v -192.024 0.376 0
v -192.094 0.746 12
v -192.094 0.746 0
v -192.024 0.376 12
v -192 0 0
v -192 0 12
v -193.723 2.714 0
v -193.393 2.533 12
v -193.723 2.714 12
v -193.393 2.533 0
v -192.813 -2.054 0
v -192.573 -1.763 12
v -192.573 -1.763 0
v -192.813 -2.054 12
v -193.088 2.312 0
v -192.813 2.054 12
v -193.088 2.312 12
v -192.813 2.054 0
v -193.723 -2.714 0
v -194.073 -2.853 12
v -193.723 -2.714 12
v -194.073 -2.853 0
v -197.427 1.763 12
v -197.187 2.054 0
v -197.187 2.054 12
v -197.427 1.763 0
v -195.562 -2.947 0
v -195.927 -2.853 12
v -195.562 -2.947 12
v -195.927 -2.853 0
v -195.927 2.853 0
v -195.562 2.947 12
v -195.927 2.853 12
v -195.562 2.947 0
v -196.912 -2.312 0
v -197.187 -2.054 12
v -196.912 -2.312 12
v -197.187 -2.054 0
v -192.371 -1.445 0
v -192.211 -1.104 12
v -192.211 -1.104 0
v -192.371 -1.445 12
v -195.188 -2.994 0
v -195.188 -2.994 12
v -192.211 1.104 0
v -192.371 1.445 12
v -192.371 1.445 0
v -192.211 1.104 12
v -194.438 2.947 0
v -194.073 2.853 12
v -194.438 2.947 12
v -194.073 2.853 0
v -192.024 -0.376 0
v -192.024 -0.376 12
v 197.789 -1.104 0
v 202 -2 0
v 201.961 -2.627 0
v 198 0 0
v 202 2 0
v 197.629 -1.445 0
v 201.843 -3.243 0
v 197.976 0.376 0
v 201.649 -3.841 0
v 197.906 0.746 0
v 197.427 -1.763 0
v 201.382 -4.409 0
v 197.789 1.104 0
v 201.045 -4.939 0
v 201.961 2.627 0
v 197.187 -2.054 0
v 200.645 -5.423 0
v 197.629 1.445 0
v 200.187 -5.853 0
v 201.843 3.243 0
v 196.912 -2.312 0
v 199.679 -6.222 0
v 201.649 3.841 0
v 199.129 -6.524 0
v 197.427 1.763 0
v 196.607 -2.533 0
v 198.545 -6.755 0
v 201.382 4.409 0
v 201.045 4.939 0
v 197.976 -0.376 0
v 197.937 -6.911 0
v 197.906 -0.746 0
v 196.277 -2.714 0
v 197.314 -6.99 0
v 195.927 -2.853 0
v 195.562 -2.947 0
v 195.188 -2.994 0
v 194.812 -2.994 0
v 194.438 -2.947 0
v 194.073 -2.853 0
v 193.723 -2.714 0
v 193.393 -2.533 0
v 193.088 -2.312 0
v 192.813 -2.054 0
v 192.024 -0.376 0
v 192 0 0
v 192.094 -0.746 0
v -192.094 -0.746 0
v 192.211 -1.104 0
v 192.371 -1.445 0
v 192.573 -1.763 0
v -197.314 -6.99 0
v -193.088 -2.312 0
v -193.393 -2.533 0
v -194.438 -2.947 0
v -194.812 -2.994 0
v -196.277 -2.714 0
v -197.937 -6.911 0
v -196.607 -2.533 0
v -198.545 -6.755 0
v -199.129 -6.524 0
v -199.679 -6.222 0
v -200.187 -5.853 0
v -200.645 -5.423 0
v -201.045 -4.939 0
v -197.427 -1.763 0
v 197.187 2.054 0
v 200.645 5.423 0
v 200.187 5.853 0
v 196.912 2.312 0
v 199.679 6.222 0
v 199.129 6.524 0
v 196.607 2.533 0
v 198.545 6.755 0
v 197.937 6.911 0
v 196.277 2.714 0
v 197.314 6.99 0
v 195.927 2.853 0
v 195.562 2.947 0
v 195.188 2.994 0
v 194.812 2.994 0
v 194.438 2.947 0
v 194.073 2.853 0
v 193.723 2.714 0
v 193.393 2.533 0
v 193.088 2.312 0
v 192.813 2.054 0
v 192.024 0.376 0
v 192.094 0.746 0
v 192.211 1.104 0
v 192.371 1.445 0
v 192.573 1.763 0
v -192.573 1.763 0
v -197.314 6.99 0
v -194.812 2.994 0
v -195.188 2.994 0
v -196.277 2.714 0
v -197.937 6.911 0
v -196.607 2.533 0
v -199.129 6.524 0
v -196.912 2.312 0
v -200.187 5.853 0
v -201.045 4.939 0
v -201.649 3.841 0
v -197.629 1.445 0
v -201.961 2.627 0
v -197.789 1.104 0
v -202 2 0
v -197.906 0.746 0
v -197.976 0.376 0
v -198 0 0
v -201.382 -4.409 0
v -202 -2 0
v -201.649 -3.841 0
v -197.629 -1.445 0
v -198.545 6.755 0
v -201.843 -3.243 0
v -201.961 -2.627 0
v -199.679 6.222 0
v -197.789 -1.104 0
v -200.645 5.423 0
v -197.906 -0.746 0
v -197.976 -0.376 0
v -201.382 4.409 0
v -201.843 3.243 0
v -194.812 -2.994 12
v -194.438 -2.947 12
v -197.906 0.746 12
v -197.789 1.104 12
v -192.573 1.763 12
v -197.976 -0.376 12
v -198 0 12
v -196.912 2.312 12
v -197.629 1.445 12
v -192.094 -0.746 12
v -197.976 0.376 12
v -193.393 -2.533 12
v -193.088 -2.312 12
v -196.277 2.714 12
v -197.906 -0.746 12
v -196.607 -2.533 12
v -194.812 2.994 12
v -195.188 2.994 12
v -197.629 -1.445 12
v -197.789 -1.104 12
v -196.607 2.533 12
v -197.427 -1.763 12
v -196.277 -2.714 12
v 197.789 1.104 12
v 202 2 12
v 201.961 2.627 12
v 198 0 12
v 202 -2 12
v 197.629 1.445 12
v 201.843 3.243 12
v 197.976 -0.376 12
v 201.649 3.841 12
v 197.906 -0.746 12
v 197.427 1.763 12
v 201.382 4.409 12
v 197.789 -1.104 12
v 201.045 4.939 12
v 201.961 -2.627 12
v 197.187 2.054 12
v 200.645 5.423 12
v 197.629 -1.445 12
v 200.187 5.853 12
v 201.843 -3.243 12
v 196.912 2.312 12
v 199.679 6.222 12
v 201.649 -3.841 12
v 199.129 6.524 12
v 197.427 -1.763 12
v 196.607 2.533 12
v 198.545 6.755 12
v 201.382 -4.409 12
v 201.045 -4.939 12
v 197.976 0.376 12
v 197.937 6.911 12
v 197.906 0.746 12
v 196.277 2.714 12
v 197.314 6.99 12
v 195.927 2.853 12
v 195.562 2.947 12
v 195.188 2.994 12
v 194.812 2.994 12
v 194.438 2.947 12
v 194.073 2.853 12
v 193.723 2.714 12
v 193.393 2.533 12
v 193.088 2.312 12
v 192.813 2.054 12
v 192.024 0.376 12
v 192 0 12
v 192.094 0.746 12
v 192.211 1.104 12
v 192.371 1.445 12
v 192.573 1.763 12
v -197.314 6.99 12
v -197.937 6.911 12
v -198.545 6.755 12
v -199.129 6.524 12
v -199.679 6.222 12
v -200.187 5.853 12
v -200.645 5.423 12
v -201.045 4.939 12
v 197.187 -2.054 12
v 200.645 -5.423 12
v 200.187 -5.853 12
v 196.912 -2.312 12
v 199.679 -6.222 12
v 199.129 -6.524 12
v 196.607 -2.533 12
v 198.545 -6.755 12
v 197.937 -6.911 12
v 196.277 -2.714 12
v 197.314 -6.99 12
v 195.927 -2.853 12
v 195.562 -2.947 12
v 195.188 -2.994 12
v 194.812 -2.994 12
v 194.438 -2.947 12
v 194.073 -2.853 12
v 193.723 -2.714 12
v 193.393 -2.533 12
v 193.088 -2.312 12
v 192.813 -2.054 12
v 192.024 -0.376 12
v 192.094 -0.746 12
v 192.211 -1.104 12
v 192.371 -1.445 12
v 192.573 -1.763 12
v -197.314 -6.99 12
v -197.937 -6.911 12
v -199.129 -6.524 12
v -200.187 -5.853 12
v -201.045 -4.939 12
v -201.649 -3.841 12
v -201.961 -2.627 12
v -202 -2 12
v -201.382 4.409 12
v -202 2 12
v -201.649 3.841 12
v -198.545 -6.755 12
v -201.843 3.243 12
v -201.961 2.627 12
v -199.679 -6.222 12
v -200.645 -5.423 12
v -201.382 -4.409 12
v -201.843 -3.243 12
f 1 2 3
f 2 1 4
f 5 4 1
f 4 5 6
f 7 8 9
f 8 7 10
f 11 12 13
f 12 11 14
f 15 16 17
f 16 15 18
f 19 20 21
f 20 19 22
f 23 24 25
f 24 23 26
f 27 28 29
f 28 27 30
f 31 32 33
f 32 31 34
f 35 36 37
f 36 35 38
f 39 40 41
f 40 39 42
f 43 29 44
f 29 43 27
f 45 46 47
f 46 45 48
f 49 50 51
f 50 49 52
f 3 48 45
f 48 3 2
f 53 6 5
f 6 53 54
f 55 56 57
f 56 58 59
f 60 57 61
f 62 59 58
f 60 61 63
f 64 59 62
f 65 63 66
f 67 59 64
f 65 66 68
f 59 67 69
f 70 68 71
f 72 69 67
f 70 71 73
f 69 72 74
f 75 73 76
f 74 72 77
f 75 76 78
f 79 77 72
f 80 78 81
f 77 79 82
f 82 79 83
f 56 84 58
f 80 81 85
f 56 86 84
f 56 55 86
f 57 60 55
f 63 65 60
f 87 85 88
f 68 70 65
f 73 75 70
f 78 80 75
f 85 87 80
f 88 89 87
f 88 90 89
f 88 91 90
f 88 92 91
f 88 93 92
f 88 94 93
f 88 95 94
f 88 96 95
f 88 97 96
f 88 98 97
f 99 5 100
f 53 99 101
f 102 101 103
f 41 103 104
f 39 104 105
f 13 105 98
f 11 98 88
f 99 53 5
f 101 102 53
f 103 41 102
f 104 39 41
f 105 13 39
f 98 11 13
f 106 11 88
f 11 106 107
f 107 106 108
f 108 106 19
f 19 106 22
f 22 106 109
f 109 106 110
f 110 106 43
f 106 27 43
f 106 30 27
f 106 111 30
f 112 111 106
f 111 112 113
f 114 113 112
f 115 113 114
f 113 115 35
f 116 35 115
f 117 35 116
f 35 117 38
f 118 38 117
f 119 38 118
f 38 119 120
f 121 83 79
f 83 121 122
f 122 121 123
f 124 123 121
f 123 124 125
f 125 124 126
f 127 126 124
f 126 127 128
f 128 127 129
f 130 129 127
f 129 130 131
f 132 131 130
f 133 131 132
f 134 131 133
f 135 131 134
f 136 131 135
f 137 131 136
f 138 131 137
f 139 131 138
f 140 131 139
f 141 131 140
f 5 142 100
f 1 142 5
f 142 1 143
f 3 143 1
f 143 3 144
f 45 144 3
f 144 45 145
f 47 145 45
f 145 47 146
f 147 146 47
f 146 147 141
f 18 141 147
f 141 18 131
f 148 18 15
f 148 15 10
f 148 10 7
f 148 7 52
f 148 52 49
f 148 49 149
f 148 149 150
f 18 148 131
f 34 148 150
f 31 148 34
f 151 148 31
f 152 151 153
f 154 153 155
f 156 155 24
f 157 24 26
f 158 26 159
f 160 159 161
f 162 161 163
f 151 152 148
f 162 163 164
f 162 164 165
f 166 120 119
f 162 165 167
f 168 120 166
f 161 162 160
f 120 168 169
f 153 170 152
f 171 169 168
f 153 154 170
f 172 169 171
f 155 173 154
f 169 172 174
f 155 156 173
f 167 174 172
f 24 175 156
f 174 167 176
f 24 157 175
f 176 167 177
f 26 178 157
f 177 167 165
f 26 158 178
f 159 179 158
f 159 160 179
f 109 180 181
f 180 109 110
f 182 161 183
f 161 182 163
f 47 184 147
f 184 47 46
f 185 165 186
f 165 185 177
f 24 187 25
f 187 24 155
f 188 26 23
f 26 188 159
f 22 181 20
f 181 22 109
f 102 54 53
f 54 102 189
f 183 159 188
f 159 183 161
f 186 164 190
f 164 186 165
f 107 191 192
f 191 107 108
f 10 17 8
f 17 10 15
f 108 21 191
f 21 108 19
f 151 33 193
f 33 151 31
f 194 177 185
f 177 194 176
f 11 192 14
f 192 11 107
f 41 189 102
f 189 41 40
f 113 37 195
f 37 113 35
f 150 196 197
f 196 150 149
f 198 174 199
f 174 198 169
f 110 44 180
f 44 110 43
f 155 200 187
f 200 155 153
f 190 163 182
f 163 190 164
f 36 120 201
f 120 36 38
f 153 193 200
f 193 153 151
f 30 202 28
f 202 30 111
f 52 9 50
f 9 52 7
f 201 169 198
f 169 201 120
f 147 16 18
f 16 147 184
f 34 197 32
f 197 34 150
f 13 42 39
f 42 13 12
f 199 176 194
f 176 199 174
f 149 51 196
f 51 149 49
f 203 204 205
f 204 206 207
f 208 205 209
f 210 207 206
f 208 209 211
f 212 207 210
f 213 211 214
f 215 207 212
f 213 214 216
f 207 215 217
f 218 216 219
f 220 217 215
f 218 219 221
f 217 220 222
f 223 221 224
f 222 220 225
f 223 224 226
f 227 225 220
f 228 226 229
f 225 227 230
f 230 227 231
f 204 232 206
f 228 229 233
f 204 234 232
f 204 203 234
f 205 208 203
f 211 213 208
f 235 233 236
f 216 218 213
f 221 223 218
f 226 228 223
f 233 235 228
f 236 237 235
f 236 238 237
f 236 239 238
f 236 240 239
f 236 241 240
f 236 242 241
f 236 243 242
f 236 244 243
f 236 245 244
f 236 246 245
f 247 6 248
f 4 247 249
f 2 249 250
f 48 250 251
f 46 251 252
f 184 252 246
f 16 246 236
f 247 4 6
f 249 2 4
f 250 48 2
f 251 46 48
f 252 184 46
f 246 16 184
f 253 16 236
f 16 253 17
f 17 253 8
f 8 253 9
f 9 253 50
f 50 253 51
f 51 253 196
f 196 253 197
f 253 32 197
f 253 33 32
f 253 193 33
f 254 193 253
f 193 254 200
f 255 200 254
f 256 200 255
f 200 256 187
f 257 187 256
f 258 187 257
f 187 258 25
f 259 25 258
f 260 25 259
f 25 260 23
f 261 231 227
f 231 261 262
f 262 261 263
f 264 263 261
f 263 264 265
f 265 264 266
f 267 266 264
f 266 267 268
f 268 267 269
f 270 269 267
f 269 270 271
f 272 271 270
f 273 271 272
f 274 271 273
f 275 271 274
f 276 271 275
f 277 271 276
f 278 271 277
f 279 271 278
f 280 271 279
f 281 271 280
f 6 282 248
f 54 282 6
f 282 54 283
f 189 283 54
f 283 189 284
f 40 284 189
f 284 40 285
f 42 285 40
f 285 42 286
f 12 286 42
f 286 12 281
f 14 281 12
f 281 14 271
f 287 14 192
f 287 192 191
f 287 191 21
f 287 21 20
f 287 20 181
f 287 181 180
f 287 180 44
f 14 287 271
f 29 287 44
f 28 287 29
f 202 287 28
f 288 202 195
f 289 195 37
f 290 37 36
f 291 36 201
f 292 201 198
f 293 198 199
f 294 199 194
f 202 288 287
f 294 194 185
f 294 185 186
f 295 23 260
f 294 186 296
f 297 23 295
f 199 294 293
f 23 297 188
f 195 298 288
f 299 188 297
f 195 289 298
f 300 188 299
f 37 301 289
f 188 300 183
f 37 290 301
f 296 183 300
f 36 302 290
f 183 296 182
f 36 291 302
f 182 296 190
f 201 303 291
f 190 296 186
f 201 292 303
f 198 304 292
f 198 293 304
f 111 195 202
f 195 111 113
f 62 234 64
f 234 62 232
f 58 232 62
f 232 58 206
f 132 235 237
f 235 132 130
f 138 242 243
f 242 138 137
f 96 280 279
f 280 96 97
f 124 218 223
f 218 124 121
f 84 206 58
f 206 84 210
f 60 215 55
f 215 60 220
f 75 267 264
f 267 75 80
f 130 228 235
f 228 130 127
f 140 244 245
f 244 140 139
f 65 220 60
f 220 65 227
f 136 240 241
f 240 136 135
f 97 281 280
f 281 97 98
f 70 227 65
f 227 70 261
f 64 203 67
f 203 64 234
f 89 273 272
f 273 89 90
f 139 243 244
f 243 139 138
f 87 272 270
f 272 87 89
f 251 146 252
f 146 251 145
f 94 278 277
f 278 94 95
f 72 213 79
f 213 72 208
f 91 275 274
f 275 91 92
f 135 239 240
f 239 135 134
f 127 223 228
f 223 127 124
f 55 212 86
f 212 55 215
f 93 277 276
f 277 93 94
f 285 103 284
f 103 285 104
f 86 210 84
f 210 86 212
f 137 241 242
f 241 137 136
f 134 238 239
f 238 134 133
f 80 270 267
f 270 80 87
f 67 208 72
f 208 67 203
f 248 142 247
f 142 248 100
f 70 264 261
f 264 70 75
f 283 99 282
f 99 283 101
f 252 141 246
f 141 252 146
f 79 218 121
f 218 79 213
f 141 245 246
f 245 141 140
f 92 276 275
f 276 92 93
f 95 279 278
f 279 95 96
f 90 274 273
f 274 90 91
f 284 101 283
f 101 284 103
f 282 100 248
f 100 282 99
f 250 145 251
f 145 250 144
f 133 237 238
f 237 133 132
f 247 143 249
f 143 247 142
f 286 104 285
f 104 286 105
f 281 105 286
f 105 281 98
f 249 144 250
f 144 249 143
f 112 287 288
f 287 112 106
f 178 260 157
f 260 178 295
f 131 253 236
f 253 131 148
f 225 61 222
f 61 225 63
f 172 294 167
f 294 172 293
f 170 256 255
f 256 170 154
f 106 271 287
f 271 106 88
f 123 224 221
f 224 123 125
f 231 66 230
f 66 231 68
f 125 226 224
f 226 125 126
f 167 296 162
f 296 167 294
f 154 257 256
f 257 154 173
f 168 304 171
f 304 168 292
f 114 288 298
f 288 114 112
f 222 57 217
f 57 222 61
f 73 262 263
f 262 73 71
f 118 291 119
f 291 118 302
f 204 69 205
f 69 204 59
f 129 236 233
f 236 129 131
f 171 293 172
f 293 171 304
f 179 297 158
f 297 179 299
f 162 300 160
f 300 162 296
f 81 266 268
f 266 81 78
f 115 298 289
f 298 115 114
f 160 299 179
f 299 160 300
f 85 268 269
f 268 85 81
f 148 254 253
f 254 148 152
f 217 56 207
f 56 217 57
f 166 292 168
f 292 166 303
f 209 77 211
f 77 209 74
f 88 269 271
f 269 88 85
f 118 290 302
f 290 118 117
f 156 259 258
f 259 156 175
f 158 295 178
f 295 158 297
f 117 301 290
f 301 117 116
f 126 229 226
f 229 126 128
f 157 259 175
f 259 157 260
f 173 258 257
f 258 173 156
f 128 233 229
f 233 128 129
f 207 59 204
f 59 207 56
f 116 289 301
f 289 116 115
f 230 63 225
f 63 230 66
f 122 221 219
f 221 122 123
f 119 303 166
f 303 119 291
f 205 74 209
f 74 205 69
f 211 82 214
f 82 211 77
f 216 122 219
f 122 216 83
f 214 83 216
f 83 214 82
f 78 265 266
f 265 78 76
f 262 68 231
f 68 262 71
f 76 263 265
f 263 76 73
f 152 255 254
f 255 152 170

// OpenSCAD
$fn = 50;


difference() {
	union() {
		hull() {
			translate(v = [-197.0000000000, 2.0000000000, 0]) {
				cylinder(h = 12, r = 5);
			}
			translate(v = [197.0000000000, 2.0000000000, 0]) {
				cylinder(h = 12, r = 5);
			}
			translate(v = [-197.0000000000, -2.0000000000, 0]) {
				cylinder(h = 12, r = 5);
			}
			translate(v = [197.0000000000, -2.0000000000, 0]) {
				cylinder(h = 12, r = 5);
			}
		}
	}
	union() {
		translate(v = [-195.0000000000, 0.0000000000, 0]) {
			cylinder(h = 12, r = 3.0000000000);
		}
		translate(v = [195.0000000000, 0.0000000000, 0]) {
			cylinder(h = 12, r = 3.0000000000);
		}
		translate(v = [-195.0000000000, 0.0000000000, 0]) {
			cylinder(h = 12, r = 1.5000000000);
		}
		translate(v = [195.0000000000, 0.0000000000, 0]) {
			cylinder(h = 12, r = 1.5000000000);
		}
		translate(v = [-195.0000000000, 0.0000000000, 0]) {
			cylinder(h = 12, r = 1.5000000000);
		}
		translate(v = [195.0000000000, 0.0000000000, 0]) {
			cylinder(h = 12, r = 1.5000000000);
		}
		translate(v = [-195.0000000000, 0.0000000000, 0]) {
			cylinder(h = 12, r = 1.5000000000);
		}
		translate(v = [195.0000000000, 0.0000000000, 0]) {
			cylinder(h = 12, r = 1.5000000000);
		}
	}
}
